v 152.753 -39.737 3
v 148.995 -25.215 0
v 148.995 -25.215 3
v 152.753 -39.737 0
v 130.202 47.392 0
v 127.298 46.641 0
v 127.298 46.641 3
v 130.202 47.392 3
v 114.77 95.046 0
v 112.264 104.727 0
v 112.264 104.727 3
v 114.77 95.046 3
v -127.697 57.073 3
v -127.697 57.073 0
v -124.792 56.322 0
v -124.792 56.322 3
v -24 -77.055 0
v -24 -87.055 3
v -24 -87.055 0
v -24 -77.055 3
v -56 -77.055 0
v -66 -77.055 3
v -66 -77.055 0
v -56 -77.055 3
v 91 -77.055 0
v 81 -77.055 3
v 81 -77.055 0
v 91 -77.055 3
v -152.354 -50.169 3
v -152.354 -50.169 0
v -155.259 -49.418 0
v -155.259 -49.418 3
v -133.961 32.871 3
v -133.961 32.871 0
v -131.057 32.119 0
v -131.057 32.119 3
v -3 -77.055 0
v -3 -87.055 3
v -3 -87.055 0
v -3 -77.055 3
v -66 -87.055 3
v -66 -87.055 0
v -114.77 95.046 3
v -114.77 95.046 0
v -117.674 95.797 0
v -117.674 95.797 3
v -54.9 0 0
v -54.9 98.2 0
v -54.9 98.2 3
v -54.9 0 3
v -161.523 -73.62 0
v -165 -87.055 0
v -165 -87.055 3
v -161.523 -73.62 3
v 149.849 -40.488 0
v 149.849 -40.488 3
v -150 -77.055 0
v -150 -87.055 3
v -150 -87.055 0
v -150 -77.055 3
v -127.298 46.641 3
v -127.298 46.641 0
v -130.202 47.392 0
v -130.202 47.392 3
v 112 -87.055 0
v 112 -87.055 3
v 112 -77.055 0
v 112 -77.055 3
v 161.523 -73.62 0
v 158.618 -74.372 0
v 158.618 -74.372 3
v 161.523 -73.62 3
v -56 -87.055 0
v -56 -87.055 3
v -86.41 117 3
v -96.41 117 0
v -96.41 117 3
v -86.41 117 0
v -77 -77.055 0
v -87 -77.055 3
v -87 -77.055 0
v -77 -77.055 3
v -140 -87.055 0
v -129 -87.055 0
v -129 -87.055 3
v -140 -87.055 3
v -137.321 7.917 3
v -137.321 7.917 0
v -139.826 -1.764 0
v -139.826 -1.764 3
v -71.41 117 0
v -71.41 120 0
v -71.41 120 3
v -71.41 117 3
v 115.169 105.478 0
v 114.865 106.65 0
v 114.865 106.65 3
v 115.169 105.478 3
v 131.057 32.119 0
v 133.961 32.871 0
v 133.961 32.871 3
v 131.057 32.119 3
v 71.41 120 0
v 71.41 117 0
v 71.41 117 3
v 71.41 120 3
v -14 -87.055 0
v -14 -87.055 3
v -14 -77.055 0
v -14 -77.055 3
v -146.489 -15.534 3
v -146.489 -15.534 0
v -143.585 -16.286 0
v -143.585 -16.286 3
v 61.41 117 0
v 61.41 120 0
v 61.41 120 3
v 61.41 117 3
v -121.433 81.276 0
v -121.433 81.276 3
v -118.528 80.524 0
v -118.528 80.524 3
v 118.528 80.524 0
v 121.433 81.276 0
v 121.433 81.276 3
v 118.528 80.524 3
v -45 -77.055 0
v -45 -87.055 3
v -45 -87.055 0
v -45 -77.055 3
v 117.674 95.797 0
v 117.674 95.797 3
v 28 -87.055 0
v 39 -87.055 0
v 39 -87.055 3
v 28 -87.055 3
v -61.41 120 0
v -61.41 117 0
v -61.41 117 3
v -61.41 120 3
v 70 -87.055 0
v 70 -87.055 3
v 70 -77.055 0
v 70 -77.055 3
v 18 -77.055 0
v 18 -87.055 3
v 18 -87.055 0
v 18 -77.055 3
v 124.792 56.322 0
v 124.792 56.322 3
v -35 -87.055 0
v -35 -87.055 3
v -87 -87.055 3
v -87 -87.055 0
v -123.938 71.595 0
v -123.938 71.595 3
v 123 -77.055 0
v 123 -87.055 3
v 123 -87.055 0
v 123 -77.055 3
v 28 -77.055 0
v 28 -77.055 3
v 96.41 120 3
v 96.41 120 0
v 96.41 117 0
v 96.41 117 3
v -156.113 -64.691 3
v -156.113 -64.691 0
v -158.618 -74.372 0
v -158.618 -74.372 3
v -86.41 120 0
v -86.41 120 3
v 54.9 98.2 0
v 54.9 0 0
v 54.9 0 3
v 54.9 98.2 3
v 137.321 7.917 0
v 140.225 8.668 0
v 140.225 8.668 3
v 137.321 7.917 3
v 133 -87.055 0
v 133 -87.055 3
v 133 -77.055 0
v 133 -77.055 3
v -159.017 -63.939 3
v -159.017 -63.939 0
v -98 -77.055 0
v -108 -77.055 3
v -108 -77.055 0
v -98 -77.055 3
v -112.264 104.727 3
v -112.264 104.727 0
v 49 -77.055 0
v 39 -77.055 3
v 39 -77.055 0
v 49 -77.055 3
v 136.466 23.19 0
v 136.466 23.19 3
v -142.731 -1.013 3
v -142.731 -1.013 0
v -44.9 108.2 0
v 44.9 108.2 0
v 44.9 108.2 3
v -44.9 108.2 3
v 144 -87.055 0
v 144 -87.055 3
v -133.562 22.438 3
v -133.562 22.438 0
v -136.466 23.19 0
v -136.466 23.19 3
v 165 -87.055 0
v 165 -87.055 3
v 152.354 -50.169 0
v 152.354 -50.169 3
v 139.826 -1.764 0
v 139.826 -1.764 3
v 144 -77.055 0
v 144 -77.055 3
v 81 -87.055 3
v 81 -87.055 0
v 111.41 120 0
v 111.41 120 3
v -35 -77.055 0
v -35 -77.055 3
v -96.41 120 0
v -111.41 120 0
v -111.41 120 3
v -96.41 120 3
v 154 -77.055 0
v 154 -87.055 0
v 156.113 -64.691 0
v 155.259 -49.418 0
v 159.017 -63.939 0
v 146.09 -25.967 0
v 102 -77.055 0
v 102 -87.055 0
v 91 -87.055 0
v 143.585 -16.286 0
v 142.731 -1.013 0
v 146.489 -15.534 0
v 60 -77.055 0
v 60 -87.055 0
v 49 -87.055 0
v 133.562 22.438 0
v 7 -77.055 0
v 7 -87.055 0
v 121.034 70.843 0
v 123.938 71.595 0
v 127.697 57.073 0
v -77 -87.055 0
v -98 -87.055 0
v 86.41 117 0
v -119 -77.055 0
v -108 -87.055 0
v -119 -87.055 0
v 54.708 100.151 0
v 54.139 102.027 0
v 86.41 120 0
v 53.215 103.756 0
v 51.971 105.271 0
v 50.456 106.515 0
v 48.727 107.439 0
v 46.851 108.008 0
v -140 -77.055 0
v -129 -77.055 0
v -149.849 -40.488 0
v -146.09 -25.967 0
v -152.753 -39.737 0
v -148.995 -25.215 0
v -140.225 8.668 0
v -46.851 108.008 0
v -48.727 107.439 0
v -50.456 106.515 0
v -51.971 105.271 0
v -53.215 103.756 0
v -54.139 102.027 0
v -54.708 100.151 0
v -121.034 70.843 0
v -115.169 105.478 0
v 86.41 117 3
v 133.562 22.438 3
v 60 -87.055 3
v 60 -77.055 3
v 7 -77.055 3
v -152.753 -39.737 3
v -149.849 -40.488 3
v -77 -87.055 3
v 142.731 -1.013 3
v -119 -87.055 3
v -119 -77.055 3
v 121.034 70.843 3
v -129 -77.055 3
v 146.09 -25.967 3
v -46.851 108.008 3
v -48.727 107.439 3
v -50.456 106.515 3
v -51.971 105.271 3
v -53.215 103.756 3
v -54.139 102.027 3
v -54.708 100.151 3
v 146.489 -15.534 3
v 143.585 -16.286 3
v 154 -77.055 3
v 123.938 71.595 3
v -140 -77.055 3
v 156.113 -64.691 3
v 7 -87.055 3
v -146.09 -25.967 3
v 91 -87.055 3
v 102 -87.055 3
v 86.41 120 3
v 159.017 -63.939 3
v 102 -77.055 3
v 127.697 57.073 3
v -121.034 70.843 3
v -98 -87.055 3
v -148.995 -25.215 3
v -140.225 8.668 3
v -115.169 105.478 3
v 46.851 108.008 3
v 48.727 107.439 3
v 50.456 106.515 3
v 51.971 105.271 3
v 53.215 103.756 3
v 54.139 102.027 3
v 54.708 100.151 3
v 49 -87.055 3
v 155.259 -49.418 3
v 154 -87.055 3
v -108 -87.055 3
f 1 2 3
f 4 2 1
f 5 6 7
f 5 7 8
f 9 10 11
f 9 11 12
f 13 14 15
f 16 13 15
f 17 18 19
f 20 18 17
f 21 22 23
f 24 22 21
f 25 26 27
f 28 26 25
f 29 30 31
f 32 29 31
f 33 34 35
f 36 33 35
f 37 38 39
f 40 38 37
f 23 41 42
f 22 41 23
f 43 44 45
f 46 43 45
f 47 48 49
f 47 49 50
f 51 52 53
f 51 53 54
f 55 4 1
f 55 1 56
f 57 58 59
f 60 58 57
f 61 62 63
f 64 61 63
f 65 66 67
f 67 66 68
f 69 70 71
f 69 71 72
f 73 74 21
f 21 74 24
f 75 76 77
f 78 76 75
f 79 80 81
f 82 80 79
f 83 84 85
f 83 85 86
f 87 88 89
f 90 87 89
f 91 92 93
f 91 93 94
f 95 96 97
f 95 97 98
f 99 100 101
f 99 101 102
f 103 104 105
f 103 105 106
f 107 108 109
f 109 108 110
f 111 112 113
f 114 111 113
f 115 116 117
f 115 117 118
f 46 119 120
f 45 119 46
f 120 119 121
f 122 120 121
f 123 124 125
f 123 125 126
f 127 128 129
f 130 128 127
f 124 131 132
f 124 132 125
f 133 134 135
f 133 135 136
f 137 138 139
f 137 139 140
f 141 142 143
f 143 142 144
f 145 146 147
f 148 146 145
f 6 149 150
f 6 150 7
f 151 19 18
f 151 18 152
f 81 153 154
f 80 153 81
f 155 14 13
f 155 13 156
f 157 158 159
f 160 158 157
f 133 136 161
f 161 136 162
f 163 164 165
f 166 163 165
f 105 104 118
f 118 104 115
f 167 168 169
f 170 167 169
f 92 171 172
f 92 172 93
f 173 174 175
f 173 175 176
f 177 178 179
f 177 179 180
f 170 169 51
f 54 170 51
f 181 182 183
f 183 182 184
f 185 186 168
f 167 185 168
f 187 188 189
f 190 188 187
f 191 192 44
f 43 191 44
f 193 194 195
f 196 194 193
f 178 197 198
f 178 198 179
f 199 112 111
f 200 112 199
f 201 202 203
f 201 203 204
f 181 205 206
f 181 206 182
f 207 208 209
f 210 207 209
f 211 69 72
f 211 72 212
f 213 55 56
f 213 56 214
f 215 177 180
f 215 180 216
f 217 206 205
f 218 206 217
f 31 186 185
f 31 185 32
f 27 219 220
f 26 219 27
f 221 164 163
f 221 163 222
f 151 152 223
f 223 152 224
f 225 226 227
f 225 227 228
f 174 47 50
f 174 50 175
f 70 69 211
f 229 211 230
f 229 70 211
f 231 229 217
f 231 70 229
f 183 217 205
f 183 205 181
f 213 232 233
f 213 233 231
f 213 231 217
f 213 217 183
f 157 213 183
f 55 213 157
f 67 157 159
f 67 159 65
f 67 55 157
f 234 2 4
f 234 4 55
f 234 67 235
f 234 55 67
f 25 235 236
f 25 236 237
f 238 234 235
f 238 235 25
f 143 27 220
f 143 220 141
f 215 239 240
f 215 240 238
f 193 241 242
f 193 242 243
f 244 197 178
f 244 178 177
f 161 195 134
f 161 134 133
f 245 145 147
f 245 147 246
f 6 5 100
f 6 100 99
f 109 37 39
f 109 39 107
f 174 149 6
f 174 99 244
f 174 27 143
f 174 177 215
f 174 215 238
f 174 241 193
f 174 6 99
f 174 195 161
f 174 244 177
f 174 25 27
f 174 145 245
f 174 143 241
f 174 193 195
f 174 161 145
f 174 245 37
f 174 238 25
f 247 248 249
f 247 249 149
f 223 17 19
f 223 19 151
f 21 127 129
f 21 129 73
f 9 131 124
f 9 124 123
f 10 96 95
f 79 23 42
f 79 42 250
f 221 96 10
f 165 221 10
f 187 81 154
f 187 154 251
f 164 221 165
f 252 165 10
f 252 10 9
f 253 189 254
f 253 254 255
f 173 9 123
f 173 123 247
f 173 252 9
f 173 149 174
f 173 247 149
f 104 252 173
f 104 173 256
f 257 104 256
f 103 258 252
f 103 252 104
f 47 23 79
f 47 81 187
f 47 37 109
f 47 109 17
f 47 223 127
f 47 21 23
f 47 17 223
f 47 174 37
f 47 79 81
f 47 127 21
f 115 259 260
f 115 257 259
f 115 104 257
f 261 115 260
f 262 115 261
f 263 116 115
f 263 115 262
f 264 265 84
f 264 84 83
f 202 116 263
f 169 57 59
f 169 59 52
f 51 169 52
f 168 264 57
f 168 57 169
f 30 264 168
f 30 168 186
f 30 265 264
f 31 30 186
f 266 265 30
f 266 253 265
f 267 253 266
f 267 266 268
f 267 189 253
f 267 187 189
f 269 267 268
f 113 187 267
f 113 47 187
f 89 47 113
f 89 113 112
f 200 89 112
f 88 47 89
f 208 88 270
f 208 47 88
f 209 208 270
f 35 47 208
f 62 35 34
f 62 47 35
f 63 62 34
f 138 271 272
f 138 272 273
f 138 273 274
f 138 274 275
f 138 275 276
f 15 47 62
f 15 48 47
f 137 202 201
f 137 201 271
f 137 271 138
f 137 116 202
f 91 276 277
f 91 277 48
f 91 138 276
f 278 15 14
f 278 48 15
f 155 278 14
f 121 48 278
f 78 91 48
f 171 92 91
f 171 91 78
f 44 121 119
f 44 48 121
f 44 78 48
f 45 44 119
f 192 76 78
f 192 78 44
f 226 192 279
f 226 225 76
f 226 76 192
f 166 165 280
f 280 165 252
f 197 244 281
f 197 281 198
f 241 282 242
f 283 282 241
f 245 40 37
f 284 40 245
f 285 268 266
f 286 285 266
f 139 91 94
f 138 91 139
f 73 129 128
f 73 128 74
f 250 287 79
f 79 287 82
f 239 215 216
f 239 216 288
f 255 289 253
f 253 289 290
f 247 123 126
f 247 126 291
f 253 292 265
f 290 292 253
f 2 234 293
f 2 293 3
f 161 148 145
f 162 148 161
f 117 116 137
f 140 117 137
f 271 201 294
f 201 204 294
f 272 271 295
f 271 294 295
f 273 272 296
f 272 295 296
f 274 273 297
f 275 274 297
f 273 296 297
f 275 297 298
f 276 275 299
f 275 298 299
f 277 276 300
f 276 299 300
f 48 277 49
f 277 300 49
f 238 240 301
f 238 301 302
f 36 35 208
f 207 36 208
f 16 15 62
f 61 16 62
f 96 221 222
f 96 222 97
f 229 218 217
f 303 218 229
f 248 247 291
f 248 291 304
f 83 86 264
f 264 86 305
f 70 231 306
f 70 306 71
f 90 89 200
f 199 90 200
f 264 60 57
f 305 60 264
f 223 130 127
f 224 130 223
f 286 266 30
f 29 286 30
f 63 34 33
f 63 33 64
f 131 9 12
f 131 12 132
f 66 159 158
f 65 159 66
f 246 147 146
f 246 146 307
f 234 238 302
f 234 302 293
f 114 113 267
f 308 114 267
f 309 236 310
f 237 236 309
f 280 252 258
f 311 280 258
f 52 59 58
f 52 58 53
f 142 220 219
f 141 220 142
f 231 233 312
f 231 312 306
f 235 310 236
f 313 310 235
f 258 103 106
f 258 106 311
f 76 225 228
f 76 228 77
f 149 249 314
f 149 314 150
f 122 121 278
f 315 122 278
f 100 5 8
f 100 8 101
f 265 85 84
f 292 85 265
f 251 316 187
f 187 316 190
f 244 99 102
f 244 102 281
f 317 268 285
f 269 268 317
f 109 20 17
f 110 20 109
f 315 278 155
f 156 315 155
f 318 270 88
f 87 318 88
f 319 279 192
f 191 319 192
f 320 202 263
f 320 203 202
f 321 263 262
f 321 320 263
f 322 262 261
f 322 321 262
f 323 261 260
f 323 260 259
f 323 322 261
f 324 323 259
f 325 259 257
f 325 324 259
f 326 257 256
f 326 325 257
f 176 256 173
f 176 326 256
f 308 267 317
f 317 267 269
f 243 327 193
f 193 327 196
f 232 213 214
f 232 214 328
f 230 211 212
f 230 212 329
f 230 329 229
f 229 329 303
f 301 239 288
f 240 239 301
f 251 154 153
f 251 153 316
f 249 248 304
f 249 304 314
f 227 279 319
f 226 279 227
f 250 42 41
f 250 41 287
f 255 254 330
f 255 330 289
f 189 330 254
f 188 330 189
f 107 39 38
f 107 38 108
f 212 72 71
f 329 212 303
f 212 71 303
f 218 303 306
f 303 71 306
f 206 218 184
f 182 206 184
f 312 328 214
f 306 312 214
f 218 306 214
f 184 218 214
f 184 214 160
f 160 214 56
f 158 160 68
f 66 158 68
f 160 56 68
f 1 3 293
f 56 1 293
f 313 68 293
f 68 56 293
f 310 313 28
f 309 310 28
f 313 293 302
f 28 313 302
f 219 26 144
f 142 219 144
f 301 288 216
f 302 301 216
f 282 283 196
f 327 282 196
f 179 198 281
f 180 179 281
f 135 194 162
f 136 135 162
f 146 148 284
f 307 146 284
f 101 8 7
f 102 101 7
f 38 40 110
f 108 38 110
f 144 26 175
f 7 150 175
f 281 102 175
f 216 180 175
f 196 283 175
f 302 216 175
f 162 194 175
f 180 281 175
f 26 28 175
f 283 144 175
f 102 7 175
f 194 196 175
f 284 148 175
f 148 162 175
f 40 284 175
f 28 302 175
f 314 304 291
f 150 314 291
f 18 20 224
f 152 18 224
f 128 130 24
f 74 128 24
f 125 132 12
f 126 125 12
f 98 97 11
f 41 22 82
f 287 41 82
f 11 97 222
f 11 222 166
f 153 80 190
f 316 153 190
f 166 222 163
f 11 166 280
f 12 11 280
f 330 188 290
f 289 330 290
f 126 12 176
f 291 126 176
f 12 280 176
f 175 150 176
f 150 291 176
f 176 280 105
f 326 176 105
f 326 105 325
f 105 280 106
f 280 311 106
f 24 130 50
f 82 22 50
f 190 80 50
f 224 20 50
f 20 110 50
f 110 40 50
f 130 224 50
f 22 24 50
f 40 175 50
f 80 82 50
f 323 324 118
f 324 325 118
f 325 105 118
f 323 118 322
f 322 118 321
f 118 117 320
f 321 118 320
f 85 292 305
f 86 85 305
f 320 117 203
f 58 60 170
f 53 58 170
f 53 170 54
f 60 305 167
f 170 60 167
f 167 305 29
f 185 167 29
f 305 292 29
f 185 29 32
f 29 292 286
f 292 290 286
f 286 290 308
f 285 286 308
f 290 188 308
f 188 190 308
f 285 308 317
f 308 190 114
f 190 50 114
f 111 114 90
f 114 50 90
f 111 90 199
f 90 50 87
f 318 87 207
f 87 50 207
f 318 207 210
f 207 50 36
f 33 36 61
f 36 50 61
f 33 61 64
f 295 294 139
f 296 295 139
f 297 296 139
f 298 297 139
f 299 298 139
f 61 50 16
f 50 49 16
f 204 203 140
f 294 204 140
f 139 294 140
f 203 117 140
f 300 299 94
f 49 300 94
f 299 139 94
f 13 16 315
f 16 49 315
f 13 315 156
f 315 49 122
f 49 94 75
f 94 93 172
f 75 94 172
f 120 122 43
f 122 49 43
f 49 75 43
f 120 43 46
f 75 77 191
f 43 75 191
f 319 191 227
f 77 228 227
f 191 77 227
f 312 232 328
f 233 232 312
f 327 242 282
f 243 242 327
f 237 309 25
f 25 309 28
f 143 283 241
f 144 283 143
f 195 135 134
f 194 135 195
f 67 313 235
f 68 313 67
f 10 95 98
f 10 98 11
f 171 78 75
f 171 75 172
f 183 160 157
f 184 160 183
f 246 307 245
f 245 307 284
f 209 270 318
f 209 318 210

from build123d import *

# Parameters (mm, degrees)
BOSS_EXTRUDE1_DEPTH  = 3
CUT_EXTRUDE2_START   = -3
CUT_EXTRUDE2_DEPTH   = 208.044112878
LPATTERN2_COUNT      = 8
LPATTERN2_PITCH      = 25
MIRROR1_START        = -3
MIRROR1_COPY_1_DEPTH = 208.044112878
MIRROR1_COPY_2_DEPTH = 208.044112878
MIRROR1_COPY_3_DEPTH = 208.044112878
MIRROR1_COPY_4_DEPTH = 208.044112878
MIRROR1_COPY_5_DEPTH = 208.044112878
MIRROR1_COPY_6_DEPTH = 208.044112878
MIRROR1_COPY_7_DEPTH = 208.044112878
CUT_EXTRUDE3_START   = -3
CUT_EXTRUDE3_DEPTH   = 208.044112878
LPATTERN3_COUNT      = 2
LPATTERN3_PITCH      = 25
MIRROR2_START        = -3
MIRROR2_COPY_1_DEPTH = 208.044112878
SKETCH5_W            = 10
SKETCH5_H            = 10
CUT_EXTRUDE7_DEPTH   = 10
LPATTERN5_COUNT      = 15
LPATTERN5_PITCH      = 21
SKETCH9_W            = 109.8
SKETCH9_H            = 11.8
BOSS_EXTRUDE2_DEPTH  = 3
FILLET1_R            = 10


with BuildPart() as part:
    # Sketch1 → Boss-Extrude1 (new body)
    with BuildSketch(Plane.XY):
        Polygon((-111.410161514, 120), (-54.9, 120), (-54.9, 0), (54.9, 0), (54.9, 120), (111.410161514, 120), (114.865412578, 106.649935044), (117.371040649, 96.968931585), (165, -87.055236082), (-165, -87.055236082), align=None)
    extrude(amount=BOSS_EXTRUDE1_DEPTH)

    # Sketch3 → Cut-Extrude2 (cut)
    with BuildSketch(Plane.XY.offset(3).offset(CUT_EXTRUDE2_START)):
        Polygon((117.674231691, 95.797491353), (115.16860362, 105.478494812), (112.264302582, 104.72680639), (114.769930653, 95.045802932), align=None)
    cut_extrude2 = extrude(amount=CUT_EXTRUDE2_DEPTH, mode=Mode.SUBTRACT)

    # LPattern2: Cut-Extrude2 ×8
    with Locations(*[Vector(0.2505628070857313, -0.968100345886375, 0) * (i * LPATTERN2_PITCH) for i in range(1, LPATTERN2_COUNT)]):
        add(cut_extrude2, mode=Mode.SUBTRACT)

    # Mirror1: Cut-Extrude2 across plane
    add(cut_extrude2.mirror(Plane(origin=(0, 0, 0), x_dir=(0, 0, 1), z_dir=(1, 0, 0))), mode=Mode.SUBTRACT)

    # Mirror1 copy 1 sketch → Mirror1 copy 1 (cut)
    with BuildSketch(Plane(origin=(-6.264070177, -24.202508647, 3), x_dir=(-1, 0, 0), z_dir=(0, 0, 1)).offset(MIRROR1_START)):
        Polygon((117.674231691, -95.797491353), (115.16860362, -105.478494812), (112.264302582, -104.72680639), (114.769930653, -95.045802932), align=None)
    extrude(amount=MIRROR1_COPY_1_DEPTH, mode=Mode.SUBTRACT)

    # Mirror1 copy 2 sketch → Mirror1 copy 2 (cut)
    with BuildSketch(Plane(origin=(-12.528140354, -48.405017294, 3), x_dir=(-1, 0, 0), z_dir=(0, 0, 1)).offset(MIRROR1_START)):
        Polygon((117.674231691, -95.797491353), (115.16860362, -105.478494812), (112.264302582, -104.72680639), (114.769930653, -95.045802932), align=None)
    extrude(amount=MIRROR1_COPY_2_DEPTH, mode=Mode.SUBTRACT)

    # Mirror1 copy 3 sketch → Mirror1 copy 3 (cut)
    with BuildSketch(Plane(origin=(-18.792210531, -72.607525941, 3), x_dir=(-1, 0, 0), z_dir=(0, 0, 1)).offset(MIRROR1_START)):
        Polygon((117.674231691, -95.797491353), (115.16860362, -105.478494812), (112.264302582, -104.72680639), (114.769930653, -95.045802932), align=None)
    extrude(amount=MIRROR1_COPY_3_DEPTH, mode=Mode.SUBTRACT)

    # Mirror1 copy 4 sketch → Mirror1 copy 4 (cut)
    with BuildSketch(Plane(origin=(-25.056280709, -96.810034589, 3), x_dir=(-1, 0, 0), z_dir=(0, 0, 1)).offset(MIRROR1_START)):
        Polygon((117.674231691, -95.797491353), (115.16860362, -105.478494812), (112.264302582, -104.72680639), (114.769930653, -95.045802932), align=None)
    extrude(amount=MIRROR1_COPY_4_DEPTH, mode=Mode.SUBTRACT)

    # Mirror1 copy 5 sketch → Mirror1 copy 5 (cut)
    with BuildSketch(Plane(origin=(-31.320350886, -121.012543236, 3), x_dir=(-1, 0, 0), z_dir=(0, 0, 1)).offset(MIRROR1_START)):
        Polygon((117.674231691, -95.797491353), (115.16860362, -105.478494812), (112.264302582, -104.72680639), (114.769930653, -95.045802932), align=None)
    extrude(amount=MIRROR1_COPY_5_DEPTH, mode=Mode.SUBTRACT)

    # Mirror1 copy 6 sketch → Mirror1 copy 6 (cut)
    with BuildSketch(Plane(origin=(-37.584421063, -145.215051883, 3), x_dir=(-1, 0, 0), z_dir=(0, 0, 1)).offset(MIRROR1_START)):
        Polygon((117.674231691, -95.797491353), (115.16860362, -105.478494812), (112.264302582, -104.72680639), (114.769930653, -95.045802932), align=None)
    extrude(amount=MIRROR1_COPY_6_DEPTH, mode=Mode.SUBTRACT)

    # Mirror1 copy 7 sketch → Mirror1 copy 7 (cut)
    with BuildSketch(Plane(origin=(-43.84849124, -169.41756053, 3), x_dir=(-1, 0, 0), z_dir=(0, 0, 1)).offset(MIRROR1_START)):
        Polygon((117.674231691, -95.797491353), (115.16860362, -105.478494812), (112.264302582, -104.72680639), (114.769930653, -95.045802932), align=None)
    extrude(amount=MIRROR1_COPY_7_DEPTH, mode=Mode.SUBTRACT)

    # Sketch4 → Cut-Extrude3 (cut)
    with BuildSketch(Plane.XY.offset(3).offset(CUT_EXTRUDE3_START)):
        Polygon((-96.410161514, 796.954701105), (-96.410161514, 120), (-96.410161514, 117), (-86.410161514, 117), (-86.410161514, 120), (-86.410161514, 796.954701105), (-86.410161514, 2150.864103316), (-96.410161514, 2150.864103316), align=None)
    cut_extrude3 = extrude(amount=CUT_EXTRUDE3_DEPTH, mode=Mode.SUBTRACT)

    # LPattern3: Cut-Extrude3 ×2
    with Locations(*[(i * LPATTERN3_PITCH, 0, 0) for i in range(1, LPATTERN3_COUNT)]):
        add(cut_extrude3, mode=Mode.SUBTRACT)

    # Mirror2: Cut-Extrude3 across plane
    add(cut_extrude3.mirror(Plane(origin=(0, 0, 0), x_dir=(0, 0, 1), z_dir=(1, 0, 0))), mode=Mode.SUBTRACT)

    # Mirror2 copy 1 sketch → Mirror2 copy 1 (cut)
    with BuildSketch(Plane(origin=(-25, 0, 3), x_dir=(-1, 0, 0), z_dir=(0, 0, 1)).offset(MIRROR2_START)):
        Polygon((-96.410161514, -796.954701105), (-96.410161514, -120), (-96.410161514, -117), (-86.410161514, -117), (-86.410161514, -120), (-86.410161514, -796.954701105), (-86.410161514, -2150.864103316), (-96.410161514, -2150.864103316), align=None)
    extrude(amount=MIRROR2_COPY_1_DEPTH, mode=Mode.SUBTRACT)

    # Sketch5 → Cut-Extrude7 (cut)
    with BuildSketch(Plane.XY.offset(3)):
        with Locations((-145, -82.055236082)):
            Rectangle(SKETCH5_W, SKETCH5_H)
    cut_extrude7 = extrude(amount=-CUT_EXTRUDE7_DEPTH, mode=Mode.SUBTRACT)

    # LPattern5: Cut-Extrude7 ×15
    with Locations(*[(i * LPATTERN5_PITCH, 0, 0) for i in range(1, LPATTERN5_COUNT)]):
        add(cut_extrude7, mode=Mode.SUBTRACT)

    # Sketch9 → Boss-Extrude2 (add)
    with BuildSketch(Plane(origin=(0, 0, 0), x_dir=(-1, 0, 0), z_dir=(0, 0, -1))):
        with Locations((0, 114.1)):
            Rectangle(SKETCH9_W, SKETCH9_H)
    extrude(amount=-BOSS_EXTRUDE2_DEPTH)

    # Fillet1
    fillet1_edges = [part.edges().sort_by_distance(p)[0] for p in [
        (54.9, 108.2, 1.5),
        (-54.9, 108.2, 1.5),
    ]]
    fillet(fillet1_edges, radius=FILLET1_R)


solid = part.part
